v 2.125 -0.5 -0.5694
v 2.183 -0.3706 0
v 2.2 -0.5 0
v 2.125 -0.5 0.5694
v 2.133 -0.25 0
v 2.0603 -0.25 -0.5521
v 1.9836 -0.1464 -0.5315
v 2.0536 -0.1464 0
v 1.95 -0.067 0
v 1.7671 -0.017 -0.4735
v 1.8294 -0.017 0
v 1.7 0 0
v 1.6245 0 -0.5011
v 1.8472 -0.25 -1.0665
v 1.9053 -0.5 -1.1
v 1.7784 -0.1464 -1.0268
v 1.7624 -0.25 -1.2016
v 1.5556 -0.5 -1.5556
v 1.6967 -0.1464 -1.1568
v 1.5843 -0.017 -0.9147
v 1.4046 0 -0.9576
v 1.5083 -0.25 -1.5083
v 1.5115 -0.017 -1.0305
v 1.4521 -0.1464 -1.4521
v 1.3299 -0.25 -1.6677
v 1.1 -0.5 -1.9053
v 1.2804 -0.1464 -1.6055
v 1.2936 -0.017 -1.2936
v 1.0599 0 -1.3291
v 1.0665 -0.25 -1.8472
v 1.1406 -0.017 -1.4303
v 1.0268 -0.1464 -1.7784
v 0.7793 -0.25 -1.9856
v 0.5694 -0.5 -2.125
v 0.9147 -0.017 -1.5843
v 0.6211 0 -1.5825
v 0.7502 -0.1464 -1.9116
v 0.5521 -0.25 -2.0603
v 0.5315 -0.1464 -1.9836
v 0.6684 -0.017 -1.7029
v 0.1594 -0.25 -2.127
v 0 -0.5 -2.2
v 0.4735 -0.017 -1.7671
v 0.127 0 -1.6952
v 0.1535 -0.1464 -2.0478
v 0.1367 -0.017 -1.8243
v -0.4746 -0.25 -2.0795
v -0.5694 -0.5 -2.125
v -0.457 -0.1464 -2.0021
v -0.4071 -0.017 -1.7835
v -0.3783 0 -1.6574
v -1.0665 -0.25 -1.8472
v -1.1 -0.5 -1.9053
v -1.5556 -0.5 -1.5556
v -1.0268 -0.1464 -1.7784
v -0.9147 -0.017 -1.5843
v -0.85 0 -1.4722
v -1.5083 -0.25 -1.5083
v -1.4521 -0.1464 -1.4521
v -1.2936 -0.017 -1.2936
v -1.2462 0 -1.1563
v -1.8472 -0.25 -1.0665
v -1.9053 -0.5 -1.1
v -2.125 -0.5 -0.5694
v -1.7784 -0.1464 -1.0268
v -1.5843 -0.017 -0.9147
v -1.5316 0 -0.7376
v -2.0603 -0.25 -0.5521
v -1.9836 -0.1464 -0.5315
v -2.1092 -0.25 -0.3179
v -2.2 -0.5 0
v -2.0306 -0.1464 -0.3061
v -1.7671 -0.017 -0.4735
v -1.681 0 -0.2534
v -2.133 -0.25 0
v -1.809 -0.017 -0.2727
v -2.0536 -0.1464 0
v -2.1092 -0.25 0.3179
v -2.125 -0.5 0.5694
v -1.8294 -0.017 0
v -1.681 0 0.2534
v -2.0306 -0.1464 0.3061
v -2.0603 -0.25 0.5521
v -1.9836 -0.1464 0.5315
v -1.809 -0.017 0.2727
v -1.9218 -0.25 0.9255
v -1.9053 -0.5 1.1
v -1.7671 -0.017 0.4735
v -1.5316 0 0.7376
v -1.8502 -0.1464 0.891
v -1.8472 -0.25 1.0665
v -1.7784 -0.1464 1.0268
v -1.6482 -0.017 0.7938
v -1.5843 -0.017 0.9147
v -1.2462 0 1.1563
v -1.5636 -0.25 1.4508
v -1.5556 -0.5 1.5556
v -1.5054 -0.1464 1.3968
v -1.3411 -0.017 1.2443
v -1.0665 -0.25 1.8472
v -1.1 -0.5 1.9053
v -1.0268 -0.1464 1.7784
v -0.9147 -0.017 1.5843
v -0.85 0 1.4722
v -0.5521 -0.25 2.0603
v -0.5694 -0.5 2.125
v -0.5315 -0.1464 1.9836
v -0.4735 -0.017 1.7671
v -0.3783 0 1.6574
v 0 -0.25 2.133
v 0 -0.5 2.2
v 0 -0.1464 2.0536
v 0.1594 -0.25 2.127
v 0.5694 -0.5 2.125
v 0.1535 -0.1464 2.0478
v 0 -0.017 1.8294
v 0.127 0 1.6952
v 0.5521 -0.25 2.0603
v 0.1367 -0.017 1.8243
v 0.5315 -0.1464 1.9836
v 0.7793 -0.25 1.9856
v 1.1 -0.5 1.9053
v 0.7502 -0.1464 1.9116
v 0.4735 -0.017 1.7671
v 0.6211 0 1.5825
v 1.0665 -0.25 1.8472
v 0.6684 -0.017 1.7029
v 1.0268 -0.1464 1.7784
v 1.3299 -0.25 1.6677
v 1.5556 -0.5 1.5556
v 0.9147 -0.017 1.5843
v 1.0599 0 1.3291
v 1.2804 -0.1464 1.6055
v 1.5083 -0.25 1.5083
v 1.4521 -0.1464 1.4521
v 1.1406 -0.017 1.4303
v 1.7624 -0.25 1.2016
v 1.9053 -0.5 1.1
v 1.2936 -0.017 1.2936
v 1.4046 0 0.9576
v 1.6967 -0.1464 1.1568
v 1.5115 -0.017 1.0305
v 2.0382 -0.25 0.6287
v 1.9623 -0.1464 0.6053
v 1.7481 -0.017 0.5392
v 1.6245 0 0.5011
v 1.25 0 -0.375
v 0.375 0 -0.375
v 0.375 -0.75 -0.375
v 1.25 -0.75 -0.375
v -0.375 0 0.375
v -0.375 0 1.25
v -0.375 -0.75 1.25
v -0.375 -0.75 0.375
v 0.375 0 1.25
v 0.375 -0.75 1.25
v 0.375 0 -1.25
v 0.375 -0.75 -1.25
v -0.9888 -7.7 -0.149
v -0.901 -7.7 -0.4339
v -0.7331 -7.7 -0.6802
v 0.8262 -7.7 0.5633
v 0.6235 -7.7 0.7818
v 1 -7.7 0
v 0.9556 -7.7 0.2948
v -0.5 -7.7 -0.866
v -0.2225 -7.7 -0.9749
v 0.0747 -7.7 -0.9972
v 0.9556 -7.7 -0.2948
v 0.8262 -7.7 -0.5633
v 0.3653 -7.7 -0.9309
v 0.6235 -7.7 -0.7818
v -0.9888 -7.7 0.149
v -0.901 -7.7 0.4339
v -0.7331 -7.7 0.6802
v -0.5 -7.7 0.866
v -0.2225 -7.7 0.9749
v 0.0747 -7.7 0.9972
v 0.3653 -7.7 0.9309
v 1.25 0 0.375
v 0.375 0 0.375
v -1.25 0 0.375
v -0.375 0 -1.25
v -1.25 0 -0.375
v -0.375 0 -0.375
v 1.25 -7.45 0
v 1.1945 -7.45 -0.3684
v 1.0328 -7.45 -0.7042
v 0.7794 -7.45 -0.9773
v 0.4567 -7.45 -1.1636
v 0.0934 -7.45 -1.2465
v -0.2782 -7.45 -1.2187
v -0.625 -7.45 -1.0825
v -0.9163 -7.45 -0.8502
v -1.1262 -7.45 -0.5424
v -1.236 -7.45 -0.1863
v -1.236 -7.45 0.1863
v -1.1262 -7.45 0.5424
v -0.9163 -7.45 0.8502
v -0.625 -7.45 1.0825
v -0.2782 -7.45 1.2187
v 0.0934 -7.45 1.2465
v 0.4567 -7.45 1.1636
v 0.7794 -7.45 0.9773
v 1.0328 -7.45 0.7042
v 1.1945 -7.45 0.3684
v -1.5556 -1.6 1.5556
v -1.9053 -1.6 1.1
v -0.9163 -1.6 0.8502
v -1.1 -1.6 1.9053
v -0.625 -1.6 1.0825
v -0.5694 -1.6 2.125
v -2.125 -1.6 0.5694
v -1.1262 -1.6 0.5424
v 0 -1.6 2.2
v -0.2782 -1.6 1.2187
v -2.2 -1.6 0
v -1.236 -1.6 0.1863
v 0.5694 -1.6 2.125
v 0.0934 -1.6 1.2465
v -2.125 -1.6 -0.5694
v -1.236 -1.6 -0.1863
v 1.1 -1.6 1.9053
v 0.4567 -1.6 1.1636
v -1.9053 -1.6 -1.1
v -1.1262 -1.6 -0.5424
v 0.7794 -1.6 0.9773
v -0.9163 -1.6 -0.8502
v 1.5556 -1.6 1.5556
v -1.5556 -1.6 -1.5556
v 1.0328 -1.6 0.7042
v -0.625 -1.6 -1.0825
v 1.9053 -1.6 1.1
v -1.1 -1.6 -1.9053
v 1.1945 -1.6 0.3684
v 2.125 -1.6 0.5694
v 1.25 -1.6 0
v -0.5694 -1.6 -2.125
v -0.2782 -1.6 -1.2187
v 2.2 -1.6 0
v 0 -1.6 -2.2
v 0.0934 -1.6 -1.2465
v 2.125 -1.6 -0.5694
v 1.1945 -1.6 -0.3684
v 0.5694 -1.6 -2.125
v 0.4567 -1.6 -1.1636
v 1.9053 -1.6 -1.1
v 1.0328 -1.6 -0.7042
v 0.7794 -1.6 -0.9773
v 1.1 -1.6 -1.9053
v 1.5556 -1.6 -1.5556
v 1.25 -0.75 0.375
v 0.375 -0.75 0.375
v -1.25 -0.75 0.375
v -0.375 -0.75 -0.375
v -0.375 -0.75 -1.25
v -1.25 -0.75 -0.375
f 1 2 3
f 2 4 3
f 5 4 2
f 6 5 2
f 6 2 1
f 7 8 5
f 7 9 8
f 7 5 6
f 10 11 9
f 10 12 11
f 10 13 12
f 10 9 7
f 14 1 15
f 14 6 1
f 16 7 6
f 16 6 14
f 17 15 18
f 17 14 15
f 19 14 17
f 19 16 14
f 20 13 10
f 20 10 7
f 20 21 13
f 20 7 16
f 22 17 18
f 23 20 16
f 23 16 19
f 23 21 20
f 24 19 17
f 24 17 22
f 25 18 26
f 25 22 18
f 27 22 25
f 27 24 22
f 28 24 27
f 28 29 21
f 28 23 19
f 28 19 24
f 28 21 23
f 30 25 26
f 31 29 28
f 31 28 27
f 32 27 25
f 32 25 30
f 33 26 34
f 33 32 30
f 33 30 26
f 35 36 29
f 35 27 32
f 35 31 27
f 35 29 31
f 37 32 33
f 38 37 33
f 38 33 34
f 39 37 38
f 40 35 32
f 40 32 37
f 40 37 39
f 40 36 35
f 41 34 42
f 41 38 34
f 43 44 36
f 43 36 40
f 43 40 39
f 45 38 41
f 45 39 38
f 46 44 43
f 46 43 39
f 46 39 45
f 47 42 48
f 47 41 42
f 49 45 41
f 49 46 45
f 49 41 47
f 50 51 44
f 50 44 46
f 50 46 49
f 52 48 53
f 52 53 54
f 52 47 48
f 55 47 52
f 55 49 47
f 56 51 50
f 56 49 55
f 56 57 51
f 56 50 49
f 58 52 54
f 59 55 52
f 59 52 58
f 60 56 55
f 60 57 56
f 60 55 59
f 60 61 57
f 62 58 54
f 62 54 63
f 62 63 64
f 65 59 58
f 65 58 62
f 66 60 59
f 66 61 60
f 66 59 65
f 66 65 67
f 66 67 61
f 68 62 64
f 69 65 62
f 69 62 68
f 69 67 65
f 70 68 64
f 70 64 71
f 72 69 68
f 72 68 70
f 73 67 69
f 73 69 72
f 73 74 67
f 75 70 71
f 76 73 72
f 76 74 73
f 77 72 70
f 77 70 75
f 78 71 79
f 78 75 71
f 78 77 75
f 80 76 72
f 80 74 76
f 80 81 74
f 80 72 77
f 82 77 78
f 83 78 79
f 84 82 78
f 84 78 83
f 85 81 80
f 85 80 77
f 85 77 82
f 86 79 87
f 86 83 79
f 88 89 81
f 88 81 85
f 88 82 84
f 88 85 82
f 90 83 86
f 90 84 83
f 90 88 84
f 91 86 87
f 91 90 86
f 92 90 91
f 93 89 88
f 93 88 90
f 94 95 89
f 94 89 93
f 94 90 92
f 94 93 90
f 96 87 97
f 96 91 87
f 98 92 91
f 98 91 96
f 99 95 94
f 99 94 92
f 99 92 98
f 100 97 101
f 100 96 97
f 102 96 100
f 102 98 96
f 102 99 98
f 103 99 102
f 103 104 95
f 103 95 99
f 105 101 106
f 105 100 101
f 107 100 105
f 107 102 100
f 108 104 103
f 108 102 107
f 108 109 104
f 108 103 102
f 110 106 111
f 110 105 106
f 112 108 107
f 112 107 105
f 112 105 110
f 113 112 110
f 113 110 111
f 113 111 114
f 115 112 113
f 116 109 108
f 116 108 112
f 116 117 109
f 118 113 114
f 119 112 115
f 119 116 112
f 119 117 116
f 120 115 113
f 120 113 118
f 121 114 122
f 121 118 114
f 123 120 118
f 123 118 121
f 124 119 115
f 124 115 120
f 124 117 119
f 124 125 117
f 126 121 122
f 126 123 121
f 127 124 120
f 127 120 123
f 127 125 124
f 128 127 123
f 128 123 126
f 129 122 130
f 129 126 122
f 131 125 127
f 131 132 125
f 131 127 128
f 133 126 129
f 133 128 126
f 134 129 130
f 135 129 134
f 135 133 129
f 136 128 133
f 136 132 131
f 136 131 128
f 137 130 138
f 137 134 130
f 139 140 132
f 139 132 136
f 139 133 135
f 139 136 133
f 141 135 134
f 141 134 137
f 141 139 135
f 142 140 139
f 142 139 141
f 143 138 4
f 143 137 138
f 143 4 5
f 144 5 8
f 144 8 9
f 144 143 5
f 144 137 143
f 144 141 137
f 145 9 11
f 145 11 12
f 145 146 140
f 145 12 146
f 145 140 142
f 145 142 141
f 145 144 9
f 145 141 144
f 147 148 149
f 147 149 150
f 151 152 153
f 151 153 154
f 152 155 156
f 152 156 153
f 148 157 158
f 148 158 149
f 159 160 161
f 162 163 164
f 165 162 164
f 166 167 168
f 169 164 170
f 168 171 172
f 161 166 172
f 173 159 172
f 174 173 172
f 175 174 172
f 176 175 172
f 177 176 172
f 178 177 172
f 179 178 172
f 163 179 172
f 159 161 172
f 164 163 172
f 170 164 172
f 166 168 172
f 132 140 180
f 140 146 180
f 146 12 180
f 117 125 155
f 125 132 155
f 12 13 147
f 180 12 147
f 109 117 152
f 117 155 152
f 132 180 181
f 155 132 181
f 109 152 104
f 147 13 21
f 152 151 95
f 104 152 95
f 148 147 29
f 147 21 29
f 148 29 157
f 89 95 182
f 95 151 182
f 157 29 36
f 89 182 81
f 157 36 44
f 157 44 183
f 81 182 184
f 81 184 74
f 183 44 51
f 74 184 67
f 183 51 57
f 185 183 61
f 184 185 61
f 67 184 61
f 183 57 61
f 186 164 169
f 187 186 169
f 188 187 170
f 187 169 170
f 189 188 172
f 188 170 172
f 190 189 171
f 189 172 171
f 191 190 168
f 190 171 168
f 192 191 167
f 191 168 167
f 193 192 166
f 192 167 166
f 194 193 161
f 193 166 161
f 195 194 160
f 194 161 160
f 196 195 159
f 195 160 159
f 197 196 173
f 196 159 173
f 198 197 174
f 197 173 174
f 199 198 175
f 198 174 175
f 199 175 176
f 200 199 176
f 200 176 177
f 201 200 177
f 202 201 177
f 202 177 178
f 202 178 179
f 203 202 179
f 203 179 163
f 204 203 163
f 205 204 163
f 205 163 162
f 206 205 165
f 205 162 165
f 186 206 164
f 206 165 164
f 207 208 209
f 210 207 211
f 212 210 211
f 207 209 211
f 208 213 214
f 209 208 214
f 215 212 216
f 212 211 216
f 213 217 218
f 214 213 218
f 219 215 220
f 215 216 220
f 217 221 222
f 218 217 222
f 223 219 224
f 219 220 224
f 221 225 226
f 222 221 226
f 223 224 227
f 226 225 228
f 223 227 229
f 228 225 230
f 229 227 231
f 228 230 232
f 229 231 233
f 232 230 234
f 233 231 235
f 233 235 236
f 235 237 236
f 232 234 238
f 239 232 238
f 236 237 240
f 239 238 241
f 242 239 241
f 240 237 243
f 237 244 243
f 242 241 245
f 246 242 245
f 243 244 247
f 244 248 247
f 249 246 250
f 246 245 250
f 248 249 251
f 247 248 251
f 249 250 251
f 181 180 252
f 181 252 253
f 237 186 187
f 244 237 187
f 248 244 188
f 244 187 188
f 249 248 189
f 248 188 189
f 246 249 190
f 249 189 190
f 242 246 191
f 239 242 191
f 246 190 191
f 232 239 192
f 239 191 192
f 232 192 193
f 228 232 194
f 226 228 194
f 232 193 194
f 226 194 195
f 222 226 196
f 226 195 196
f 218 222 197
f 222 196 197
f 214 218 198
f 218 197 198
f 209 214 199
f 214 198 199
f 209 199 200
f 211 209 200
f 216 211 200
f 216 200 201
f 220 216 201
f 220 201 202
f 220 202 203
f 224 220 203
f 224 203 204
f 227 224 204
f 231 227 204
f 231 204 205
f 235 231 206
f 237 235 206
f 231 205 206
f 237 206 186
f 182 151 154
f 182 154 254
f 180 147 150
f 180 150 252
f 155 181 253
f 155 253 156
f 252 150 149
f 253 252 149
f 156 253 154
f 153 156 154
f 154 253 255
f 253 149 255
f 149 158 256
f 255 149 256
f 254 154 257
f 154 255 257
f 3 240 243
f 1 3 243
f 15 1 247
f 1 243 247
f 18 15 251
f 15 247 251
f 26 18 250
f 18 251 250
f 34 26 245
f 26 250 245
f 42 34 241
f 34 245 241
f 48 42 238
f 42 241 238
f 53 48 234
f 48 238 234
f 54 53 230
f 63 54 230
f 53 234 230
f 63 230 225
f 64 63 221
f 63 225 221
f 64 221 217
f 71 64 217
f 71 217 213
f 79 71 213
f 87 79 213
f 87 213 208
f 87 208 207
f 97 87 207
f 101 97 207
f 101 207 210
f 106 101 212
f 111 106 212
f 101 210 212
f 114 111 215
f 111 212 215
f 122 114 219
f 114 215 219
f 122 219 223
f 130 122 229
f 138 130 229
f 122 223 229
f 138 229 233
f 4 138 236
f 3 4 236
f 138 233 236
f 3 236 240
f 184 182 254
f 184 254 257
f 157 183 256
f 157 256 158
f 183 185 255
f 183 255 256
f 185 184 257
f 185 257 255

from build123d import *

# Parameters (mm, degrees)
CHAMFER1_SIZE      = 0.25
FILLET1_R          = 0.5
CUT_EXTRUDE1_DEPTH = 0.75


with BuildPart() as part:
    # Sketch1 → Revolve1 (revolve)
    with BuildSketch(Plane.XY, mode=Mode.PRIVATE) as revolve1_sk:
        Polygon((0, 0), (-2.2, 0), (-2.2, -1.6), (-1.25, -1.6), (-1.25, -7.7), (0, -7.7), align=None)
    revolve(revolve1_sk.sketch.rotate(Axis((0, -138.087166902, 0), (0, 1, 0)), 180), axis=Axis((0, -138.087166902, 0), (0, 1, 0)))

    # Chamfer1
    chamfer1_edges = [part.edges().sort_by_distance(p)[0] for p in [
        (-1.25, -7.7, 0),
    ]]
    chamfer(chamfer1_edges, length=CHAMFER1_SIZE)

    # Fillet1
    fillet1_edges = [part.edges().sort_by_distance(p)[0] for p in [
        (-2.2, 0, 0),
    ]]
    fillet(fillet1_edges, radius=FILLET1_R)

    # Sketch2 → Cut-Extrude1 (cut)
    with BuildSketch(Plane(origin=(0, 0, 0), x_dir=(1, 0, 0), z_dir=(0, 1, 0))):
        Polygon((-0.375, 0.375), (-0.375, 1.25), (0.375, 1.25), (0.375, 0.375), (1.25, 0.375), (1.25, -0.375), (0.375, -0.375), (0.375, -1.25), (-0.375, -1.25), (-0.375, -0.375), (-1.25, -0.375), (-1.25, 0.375), align=None)
    extrude(amount=-CUT_EXTRUDE1_DEPTH, mode=Mode.SUBTRACT)


solid = part.part
